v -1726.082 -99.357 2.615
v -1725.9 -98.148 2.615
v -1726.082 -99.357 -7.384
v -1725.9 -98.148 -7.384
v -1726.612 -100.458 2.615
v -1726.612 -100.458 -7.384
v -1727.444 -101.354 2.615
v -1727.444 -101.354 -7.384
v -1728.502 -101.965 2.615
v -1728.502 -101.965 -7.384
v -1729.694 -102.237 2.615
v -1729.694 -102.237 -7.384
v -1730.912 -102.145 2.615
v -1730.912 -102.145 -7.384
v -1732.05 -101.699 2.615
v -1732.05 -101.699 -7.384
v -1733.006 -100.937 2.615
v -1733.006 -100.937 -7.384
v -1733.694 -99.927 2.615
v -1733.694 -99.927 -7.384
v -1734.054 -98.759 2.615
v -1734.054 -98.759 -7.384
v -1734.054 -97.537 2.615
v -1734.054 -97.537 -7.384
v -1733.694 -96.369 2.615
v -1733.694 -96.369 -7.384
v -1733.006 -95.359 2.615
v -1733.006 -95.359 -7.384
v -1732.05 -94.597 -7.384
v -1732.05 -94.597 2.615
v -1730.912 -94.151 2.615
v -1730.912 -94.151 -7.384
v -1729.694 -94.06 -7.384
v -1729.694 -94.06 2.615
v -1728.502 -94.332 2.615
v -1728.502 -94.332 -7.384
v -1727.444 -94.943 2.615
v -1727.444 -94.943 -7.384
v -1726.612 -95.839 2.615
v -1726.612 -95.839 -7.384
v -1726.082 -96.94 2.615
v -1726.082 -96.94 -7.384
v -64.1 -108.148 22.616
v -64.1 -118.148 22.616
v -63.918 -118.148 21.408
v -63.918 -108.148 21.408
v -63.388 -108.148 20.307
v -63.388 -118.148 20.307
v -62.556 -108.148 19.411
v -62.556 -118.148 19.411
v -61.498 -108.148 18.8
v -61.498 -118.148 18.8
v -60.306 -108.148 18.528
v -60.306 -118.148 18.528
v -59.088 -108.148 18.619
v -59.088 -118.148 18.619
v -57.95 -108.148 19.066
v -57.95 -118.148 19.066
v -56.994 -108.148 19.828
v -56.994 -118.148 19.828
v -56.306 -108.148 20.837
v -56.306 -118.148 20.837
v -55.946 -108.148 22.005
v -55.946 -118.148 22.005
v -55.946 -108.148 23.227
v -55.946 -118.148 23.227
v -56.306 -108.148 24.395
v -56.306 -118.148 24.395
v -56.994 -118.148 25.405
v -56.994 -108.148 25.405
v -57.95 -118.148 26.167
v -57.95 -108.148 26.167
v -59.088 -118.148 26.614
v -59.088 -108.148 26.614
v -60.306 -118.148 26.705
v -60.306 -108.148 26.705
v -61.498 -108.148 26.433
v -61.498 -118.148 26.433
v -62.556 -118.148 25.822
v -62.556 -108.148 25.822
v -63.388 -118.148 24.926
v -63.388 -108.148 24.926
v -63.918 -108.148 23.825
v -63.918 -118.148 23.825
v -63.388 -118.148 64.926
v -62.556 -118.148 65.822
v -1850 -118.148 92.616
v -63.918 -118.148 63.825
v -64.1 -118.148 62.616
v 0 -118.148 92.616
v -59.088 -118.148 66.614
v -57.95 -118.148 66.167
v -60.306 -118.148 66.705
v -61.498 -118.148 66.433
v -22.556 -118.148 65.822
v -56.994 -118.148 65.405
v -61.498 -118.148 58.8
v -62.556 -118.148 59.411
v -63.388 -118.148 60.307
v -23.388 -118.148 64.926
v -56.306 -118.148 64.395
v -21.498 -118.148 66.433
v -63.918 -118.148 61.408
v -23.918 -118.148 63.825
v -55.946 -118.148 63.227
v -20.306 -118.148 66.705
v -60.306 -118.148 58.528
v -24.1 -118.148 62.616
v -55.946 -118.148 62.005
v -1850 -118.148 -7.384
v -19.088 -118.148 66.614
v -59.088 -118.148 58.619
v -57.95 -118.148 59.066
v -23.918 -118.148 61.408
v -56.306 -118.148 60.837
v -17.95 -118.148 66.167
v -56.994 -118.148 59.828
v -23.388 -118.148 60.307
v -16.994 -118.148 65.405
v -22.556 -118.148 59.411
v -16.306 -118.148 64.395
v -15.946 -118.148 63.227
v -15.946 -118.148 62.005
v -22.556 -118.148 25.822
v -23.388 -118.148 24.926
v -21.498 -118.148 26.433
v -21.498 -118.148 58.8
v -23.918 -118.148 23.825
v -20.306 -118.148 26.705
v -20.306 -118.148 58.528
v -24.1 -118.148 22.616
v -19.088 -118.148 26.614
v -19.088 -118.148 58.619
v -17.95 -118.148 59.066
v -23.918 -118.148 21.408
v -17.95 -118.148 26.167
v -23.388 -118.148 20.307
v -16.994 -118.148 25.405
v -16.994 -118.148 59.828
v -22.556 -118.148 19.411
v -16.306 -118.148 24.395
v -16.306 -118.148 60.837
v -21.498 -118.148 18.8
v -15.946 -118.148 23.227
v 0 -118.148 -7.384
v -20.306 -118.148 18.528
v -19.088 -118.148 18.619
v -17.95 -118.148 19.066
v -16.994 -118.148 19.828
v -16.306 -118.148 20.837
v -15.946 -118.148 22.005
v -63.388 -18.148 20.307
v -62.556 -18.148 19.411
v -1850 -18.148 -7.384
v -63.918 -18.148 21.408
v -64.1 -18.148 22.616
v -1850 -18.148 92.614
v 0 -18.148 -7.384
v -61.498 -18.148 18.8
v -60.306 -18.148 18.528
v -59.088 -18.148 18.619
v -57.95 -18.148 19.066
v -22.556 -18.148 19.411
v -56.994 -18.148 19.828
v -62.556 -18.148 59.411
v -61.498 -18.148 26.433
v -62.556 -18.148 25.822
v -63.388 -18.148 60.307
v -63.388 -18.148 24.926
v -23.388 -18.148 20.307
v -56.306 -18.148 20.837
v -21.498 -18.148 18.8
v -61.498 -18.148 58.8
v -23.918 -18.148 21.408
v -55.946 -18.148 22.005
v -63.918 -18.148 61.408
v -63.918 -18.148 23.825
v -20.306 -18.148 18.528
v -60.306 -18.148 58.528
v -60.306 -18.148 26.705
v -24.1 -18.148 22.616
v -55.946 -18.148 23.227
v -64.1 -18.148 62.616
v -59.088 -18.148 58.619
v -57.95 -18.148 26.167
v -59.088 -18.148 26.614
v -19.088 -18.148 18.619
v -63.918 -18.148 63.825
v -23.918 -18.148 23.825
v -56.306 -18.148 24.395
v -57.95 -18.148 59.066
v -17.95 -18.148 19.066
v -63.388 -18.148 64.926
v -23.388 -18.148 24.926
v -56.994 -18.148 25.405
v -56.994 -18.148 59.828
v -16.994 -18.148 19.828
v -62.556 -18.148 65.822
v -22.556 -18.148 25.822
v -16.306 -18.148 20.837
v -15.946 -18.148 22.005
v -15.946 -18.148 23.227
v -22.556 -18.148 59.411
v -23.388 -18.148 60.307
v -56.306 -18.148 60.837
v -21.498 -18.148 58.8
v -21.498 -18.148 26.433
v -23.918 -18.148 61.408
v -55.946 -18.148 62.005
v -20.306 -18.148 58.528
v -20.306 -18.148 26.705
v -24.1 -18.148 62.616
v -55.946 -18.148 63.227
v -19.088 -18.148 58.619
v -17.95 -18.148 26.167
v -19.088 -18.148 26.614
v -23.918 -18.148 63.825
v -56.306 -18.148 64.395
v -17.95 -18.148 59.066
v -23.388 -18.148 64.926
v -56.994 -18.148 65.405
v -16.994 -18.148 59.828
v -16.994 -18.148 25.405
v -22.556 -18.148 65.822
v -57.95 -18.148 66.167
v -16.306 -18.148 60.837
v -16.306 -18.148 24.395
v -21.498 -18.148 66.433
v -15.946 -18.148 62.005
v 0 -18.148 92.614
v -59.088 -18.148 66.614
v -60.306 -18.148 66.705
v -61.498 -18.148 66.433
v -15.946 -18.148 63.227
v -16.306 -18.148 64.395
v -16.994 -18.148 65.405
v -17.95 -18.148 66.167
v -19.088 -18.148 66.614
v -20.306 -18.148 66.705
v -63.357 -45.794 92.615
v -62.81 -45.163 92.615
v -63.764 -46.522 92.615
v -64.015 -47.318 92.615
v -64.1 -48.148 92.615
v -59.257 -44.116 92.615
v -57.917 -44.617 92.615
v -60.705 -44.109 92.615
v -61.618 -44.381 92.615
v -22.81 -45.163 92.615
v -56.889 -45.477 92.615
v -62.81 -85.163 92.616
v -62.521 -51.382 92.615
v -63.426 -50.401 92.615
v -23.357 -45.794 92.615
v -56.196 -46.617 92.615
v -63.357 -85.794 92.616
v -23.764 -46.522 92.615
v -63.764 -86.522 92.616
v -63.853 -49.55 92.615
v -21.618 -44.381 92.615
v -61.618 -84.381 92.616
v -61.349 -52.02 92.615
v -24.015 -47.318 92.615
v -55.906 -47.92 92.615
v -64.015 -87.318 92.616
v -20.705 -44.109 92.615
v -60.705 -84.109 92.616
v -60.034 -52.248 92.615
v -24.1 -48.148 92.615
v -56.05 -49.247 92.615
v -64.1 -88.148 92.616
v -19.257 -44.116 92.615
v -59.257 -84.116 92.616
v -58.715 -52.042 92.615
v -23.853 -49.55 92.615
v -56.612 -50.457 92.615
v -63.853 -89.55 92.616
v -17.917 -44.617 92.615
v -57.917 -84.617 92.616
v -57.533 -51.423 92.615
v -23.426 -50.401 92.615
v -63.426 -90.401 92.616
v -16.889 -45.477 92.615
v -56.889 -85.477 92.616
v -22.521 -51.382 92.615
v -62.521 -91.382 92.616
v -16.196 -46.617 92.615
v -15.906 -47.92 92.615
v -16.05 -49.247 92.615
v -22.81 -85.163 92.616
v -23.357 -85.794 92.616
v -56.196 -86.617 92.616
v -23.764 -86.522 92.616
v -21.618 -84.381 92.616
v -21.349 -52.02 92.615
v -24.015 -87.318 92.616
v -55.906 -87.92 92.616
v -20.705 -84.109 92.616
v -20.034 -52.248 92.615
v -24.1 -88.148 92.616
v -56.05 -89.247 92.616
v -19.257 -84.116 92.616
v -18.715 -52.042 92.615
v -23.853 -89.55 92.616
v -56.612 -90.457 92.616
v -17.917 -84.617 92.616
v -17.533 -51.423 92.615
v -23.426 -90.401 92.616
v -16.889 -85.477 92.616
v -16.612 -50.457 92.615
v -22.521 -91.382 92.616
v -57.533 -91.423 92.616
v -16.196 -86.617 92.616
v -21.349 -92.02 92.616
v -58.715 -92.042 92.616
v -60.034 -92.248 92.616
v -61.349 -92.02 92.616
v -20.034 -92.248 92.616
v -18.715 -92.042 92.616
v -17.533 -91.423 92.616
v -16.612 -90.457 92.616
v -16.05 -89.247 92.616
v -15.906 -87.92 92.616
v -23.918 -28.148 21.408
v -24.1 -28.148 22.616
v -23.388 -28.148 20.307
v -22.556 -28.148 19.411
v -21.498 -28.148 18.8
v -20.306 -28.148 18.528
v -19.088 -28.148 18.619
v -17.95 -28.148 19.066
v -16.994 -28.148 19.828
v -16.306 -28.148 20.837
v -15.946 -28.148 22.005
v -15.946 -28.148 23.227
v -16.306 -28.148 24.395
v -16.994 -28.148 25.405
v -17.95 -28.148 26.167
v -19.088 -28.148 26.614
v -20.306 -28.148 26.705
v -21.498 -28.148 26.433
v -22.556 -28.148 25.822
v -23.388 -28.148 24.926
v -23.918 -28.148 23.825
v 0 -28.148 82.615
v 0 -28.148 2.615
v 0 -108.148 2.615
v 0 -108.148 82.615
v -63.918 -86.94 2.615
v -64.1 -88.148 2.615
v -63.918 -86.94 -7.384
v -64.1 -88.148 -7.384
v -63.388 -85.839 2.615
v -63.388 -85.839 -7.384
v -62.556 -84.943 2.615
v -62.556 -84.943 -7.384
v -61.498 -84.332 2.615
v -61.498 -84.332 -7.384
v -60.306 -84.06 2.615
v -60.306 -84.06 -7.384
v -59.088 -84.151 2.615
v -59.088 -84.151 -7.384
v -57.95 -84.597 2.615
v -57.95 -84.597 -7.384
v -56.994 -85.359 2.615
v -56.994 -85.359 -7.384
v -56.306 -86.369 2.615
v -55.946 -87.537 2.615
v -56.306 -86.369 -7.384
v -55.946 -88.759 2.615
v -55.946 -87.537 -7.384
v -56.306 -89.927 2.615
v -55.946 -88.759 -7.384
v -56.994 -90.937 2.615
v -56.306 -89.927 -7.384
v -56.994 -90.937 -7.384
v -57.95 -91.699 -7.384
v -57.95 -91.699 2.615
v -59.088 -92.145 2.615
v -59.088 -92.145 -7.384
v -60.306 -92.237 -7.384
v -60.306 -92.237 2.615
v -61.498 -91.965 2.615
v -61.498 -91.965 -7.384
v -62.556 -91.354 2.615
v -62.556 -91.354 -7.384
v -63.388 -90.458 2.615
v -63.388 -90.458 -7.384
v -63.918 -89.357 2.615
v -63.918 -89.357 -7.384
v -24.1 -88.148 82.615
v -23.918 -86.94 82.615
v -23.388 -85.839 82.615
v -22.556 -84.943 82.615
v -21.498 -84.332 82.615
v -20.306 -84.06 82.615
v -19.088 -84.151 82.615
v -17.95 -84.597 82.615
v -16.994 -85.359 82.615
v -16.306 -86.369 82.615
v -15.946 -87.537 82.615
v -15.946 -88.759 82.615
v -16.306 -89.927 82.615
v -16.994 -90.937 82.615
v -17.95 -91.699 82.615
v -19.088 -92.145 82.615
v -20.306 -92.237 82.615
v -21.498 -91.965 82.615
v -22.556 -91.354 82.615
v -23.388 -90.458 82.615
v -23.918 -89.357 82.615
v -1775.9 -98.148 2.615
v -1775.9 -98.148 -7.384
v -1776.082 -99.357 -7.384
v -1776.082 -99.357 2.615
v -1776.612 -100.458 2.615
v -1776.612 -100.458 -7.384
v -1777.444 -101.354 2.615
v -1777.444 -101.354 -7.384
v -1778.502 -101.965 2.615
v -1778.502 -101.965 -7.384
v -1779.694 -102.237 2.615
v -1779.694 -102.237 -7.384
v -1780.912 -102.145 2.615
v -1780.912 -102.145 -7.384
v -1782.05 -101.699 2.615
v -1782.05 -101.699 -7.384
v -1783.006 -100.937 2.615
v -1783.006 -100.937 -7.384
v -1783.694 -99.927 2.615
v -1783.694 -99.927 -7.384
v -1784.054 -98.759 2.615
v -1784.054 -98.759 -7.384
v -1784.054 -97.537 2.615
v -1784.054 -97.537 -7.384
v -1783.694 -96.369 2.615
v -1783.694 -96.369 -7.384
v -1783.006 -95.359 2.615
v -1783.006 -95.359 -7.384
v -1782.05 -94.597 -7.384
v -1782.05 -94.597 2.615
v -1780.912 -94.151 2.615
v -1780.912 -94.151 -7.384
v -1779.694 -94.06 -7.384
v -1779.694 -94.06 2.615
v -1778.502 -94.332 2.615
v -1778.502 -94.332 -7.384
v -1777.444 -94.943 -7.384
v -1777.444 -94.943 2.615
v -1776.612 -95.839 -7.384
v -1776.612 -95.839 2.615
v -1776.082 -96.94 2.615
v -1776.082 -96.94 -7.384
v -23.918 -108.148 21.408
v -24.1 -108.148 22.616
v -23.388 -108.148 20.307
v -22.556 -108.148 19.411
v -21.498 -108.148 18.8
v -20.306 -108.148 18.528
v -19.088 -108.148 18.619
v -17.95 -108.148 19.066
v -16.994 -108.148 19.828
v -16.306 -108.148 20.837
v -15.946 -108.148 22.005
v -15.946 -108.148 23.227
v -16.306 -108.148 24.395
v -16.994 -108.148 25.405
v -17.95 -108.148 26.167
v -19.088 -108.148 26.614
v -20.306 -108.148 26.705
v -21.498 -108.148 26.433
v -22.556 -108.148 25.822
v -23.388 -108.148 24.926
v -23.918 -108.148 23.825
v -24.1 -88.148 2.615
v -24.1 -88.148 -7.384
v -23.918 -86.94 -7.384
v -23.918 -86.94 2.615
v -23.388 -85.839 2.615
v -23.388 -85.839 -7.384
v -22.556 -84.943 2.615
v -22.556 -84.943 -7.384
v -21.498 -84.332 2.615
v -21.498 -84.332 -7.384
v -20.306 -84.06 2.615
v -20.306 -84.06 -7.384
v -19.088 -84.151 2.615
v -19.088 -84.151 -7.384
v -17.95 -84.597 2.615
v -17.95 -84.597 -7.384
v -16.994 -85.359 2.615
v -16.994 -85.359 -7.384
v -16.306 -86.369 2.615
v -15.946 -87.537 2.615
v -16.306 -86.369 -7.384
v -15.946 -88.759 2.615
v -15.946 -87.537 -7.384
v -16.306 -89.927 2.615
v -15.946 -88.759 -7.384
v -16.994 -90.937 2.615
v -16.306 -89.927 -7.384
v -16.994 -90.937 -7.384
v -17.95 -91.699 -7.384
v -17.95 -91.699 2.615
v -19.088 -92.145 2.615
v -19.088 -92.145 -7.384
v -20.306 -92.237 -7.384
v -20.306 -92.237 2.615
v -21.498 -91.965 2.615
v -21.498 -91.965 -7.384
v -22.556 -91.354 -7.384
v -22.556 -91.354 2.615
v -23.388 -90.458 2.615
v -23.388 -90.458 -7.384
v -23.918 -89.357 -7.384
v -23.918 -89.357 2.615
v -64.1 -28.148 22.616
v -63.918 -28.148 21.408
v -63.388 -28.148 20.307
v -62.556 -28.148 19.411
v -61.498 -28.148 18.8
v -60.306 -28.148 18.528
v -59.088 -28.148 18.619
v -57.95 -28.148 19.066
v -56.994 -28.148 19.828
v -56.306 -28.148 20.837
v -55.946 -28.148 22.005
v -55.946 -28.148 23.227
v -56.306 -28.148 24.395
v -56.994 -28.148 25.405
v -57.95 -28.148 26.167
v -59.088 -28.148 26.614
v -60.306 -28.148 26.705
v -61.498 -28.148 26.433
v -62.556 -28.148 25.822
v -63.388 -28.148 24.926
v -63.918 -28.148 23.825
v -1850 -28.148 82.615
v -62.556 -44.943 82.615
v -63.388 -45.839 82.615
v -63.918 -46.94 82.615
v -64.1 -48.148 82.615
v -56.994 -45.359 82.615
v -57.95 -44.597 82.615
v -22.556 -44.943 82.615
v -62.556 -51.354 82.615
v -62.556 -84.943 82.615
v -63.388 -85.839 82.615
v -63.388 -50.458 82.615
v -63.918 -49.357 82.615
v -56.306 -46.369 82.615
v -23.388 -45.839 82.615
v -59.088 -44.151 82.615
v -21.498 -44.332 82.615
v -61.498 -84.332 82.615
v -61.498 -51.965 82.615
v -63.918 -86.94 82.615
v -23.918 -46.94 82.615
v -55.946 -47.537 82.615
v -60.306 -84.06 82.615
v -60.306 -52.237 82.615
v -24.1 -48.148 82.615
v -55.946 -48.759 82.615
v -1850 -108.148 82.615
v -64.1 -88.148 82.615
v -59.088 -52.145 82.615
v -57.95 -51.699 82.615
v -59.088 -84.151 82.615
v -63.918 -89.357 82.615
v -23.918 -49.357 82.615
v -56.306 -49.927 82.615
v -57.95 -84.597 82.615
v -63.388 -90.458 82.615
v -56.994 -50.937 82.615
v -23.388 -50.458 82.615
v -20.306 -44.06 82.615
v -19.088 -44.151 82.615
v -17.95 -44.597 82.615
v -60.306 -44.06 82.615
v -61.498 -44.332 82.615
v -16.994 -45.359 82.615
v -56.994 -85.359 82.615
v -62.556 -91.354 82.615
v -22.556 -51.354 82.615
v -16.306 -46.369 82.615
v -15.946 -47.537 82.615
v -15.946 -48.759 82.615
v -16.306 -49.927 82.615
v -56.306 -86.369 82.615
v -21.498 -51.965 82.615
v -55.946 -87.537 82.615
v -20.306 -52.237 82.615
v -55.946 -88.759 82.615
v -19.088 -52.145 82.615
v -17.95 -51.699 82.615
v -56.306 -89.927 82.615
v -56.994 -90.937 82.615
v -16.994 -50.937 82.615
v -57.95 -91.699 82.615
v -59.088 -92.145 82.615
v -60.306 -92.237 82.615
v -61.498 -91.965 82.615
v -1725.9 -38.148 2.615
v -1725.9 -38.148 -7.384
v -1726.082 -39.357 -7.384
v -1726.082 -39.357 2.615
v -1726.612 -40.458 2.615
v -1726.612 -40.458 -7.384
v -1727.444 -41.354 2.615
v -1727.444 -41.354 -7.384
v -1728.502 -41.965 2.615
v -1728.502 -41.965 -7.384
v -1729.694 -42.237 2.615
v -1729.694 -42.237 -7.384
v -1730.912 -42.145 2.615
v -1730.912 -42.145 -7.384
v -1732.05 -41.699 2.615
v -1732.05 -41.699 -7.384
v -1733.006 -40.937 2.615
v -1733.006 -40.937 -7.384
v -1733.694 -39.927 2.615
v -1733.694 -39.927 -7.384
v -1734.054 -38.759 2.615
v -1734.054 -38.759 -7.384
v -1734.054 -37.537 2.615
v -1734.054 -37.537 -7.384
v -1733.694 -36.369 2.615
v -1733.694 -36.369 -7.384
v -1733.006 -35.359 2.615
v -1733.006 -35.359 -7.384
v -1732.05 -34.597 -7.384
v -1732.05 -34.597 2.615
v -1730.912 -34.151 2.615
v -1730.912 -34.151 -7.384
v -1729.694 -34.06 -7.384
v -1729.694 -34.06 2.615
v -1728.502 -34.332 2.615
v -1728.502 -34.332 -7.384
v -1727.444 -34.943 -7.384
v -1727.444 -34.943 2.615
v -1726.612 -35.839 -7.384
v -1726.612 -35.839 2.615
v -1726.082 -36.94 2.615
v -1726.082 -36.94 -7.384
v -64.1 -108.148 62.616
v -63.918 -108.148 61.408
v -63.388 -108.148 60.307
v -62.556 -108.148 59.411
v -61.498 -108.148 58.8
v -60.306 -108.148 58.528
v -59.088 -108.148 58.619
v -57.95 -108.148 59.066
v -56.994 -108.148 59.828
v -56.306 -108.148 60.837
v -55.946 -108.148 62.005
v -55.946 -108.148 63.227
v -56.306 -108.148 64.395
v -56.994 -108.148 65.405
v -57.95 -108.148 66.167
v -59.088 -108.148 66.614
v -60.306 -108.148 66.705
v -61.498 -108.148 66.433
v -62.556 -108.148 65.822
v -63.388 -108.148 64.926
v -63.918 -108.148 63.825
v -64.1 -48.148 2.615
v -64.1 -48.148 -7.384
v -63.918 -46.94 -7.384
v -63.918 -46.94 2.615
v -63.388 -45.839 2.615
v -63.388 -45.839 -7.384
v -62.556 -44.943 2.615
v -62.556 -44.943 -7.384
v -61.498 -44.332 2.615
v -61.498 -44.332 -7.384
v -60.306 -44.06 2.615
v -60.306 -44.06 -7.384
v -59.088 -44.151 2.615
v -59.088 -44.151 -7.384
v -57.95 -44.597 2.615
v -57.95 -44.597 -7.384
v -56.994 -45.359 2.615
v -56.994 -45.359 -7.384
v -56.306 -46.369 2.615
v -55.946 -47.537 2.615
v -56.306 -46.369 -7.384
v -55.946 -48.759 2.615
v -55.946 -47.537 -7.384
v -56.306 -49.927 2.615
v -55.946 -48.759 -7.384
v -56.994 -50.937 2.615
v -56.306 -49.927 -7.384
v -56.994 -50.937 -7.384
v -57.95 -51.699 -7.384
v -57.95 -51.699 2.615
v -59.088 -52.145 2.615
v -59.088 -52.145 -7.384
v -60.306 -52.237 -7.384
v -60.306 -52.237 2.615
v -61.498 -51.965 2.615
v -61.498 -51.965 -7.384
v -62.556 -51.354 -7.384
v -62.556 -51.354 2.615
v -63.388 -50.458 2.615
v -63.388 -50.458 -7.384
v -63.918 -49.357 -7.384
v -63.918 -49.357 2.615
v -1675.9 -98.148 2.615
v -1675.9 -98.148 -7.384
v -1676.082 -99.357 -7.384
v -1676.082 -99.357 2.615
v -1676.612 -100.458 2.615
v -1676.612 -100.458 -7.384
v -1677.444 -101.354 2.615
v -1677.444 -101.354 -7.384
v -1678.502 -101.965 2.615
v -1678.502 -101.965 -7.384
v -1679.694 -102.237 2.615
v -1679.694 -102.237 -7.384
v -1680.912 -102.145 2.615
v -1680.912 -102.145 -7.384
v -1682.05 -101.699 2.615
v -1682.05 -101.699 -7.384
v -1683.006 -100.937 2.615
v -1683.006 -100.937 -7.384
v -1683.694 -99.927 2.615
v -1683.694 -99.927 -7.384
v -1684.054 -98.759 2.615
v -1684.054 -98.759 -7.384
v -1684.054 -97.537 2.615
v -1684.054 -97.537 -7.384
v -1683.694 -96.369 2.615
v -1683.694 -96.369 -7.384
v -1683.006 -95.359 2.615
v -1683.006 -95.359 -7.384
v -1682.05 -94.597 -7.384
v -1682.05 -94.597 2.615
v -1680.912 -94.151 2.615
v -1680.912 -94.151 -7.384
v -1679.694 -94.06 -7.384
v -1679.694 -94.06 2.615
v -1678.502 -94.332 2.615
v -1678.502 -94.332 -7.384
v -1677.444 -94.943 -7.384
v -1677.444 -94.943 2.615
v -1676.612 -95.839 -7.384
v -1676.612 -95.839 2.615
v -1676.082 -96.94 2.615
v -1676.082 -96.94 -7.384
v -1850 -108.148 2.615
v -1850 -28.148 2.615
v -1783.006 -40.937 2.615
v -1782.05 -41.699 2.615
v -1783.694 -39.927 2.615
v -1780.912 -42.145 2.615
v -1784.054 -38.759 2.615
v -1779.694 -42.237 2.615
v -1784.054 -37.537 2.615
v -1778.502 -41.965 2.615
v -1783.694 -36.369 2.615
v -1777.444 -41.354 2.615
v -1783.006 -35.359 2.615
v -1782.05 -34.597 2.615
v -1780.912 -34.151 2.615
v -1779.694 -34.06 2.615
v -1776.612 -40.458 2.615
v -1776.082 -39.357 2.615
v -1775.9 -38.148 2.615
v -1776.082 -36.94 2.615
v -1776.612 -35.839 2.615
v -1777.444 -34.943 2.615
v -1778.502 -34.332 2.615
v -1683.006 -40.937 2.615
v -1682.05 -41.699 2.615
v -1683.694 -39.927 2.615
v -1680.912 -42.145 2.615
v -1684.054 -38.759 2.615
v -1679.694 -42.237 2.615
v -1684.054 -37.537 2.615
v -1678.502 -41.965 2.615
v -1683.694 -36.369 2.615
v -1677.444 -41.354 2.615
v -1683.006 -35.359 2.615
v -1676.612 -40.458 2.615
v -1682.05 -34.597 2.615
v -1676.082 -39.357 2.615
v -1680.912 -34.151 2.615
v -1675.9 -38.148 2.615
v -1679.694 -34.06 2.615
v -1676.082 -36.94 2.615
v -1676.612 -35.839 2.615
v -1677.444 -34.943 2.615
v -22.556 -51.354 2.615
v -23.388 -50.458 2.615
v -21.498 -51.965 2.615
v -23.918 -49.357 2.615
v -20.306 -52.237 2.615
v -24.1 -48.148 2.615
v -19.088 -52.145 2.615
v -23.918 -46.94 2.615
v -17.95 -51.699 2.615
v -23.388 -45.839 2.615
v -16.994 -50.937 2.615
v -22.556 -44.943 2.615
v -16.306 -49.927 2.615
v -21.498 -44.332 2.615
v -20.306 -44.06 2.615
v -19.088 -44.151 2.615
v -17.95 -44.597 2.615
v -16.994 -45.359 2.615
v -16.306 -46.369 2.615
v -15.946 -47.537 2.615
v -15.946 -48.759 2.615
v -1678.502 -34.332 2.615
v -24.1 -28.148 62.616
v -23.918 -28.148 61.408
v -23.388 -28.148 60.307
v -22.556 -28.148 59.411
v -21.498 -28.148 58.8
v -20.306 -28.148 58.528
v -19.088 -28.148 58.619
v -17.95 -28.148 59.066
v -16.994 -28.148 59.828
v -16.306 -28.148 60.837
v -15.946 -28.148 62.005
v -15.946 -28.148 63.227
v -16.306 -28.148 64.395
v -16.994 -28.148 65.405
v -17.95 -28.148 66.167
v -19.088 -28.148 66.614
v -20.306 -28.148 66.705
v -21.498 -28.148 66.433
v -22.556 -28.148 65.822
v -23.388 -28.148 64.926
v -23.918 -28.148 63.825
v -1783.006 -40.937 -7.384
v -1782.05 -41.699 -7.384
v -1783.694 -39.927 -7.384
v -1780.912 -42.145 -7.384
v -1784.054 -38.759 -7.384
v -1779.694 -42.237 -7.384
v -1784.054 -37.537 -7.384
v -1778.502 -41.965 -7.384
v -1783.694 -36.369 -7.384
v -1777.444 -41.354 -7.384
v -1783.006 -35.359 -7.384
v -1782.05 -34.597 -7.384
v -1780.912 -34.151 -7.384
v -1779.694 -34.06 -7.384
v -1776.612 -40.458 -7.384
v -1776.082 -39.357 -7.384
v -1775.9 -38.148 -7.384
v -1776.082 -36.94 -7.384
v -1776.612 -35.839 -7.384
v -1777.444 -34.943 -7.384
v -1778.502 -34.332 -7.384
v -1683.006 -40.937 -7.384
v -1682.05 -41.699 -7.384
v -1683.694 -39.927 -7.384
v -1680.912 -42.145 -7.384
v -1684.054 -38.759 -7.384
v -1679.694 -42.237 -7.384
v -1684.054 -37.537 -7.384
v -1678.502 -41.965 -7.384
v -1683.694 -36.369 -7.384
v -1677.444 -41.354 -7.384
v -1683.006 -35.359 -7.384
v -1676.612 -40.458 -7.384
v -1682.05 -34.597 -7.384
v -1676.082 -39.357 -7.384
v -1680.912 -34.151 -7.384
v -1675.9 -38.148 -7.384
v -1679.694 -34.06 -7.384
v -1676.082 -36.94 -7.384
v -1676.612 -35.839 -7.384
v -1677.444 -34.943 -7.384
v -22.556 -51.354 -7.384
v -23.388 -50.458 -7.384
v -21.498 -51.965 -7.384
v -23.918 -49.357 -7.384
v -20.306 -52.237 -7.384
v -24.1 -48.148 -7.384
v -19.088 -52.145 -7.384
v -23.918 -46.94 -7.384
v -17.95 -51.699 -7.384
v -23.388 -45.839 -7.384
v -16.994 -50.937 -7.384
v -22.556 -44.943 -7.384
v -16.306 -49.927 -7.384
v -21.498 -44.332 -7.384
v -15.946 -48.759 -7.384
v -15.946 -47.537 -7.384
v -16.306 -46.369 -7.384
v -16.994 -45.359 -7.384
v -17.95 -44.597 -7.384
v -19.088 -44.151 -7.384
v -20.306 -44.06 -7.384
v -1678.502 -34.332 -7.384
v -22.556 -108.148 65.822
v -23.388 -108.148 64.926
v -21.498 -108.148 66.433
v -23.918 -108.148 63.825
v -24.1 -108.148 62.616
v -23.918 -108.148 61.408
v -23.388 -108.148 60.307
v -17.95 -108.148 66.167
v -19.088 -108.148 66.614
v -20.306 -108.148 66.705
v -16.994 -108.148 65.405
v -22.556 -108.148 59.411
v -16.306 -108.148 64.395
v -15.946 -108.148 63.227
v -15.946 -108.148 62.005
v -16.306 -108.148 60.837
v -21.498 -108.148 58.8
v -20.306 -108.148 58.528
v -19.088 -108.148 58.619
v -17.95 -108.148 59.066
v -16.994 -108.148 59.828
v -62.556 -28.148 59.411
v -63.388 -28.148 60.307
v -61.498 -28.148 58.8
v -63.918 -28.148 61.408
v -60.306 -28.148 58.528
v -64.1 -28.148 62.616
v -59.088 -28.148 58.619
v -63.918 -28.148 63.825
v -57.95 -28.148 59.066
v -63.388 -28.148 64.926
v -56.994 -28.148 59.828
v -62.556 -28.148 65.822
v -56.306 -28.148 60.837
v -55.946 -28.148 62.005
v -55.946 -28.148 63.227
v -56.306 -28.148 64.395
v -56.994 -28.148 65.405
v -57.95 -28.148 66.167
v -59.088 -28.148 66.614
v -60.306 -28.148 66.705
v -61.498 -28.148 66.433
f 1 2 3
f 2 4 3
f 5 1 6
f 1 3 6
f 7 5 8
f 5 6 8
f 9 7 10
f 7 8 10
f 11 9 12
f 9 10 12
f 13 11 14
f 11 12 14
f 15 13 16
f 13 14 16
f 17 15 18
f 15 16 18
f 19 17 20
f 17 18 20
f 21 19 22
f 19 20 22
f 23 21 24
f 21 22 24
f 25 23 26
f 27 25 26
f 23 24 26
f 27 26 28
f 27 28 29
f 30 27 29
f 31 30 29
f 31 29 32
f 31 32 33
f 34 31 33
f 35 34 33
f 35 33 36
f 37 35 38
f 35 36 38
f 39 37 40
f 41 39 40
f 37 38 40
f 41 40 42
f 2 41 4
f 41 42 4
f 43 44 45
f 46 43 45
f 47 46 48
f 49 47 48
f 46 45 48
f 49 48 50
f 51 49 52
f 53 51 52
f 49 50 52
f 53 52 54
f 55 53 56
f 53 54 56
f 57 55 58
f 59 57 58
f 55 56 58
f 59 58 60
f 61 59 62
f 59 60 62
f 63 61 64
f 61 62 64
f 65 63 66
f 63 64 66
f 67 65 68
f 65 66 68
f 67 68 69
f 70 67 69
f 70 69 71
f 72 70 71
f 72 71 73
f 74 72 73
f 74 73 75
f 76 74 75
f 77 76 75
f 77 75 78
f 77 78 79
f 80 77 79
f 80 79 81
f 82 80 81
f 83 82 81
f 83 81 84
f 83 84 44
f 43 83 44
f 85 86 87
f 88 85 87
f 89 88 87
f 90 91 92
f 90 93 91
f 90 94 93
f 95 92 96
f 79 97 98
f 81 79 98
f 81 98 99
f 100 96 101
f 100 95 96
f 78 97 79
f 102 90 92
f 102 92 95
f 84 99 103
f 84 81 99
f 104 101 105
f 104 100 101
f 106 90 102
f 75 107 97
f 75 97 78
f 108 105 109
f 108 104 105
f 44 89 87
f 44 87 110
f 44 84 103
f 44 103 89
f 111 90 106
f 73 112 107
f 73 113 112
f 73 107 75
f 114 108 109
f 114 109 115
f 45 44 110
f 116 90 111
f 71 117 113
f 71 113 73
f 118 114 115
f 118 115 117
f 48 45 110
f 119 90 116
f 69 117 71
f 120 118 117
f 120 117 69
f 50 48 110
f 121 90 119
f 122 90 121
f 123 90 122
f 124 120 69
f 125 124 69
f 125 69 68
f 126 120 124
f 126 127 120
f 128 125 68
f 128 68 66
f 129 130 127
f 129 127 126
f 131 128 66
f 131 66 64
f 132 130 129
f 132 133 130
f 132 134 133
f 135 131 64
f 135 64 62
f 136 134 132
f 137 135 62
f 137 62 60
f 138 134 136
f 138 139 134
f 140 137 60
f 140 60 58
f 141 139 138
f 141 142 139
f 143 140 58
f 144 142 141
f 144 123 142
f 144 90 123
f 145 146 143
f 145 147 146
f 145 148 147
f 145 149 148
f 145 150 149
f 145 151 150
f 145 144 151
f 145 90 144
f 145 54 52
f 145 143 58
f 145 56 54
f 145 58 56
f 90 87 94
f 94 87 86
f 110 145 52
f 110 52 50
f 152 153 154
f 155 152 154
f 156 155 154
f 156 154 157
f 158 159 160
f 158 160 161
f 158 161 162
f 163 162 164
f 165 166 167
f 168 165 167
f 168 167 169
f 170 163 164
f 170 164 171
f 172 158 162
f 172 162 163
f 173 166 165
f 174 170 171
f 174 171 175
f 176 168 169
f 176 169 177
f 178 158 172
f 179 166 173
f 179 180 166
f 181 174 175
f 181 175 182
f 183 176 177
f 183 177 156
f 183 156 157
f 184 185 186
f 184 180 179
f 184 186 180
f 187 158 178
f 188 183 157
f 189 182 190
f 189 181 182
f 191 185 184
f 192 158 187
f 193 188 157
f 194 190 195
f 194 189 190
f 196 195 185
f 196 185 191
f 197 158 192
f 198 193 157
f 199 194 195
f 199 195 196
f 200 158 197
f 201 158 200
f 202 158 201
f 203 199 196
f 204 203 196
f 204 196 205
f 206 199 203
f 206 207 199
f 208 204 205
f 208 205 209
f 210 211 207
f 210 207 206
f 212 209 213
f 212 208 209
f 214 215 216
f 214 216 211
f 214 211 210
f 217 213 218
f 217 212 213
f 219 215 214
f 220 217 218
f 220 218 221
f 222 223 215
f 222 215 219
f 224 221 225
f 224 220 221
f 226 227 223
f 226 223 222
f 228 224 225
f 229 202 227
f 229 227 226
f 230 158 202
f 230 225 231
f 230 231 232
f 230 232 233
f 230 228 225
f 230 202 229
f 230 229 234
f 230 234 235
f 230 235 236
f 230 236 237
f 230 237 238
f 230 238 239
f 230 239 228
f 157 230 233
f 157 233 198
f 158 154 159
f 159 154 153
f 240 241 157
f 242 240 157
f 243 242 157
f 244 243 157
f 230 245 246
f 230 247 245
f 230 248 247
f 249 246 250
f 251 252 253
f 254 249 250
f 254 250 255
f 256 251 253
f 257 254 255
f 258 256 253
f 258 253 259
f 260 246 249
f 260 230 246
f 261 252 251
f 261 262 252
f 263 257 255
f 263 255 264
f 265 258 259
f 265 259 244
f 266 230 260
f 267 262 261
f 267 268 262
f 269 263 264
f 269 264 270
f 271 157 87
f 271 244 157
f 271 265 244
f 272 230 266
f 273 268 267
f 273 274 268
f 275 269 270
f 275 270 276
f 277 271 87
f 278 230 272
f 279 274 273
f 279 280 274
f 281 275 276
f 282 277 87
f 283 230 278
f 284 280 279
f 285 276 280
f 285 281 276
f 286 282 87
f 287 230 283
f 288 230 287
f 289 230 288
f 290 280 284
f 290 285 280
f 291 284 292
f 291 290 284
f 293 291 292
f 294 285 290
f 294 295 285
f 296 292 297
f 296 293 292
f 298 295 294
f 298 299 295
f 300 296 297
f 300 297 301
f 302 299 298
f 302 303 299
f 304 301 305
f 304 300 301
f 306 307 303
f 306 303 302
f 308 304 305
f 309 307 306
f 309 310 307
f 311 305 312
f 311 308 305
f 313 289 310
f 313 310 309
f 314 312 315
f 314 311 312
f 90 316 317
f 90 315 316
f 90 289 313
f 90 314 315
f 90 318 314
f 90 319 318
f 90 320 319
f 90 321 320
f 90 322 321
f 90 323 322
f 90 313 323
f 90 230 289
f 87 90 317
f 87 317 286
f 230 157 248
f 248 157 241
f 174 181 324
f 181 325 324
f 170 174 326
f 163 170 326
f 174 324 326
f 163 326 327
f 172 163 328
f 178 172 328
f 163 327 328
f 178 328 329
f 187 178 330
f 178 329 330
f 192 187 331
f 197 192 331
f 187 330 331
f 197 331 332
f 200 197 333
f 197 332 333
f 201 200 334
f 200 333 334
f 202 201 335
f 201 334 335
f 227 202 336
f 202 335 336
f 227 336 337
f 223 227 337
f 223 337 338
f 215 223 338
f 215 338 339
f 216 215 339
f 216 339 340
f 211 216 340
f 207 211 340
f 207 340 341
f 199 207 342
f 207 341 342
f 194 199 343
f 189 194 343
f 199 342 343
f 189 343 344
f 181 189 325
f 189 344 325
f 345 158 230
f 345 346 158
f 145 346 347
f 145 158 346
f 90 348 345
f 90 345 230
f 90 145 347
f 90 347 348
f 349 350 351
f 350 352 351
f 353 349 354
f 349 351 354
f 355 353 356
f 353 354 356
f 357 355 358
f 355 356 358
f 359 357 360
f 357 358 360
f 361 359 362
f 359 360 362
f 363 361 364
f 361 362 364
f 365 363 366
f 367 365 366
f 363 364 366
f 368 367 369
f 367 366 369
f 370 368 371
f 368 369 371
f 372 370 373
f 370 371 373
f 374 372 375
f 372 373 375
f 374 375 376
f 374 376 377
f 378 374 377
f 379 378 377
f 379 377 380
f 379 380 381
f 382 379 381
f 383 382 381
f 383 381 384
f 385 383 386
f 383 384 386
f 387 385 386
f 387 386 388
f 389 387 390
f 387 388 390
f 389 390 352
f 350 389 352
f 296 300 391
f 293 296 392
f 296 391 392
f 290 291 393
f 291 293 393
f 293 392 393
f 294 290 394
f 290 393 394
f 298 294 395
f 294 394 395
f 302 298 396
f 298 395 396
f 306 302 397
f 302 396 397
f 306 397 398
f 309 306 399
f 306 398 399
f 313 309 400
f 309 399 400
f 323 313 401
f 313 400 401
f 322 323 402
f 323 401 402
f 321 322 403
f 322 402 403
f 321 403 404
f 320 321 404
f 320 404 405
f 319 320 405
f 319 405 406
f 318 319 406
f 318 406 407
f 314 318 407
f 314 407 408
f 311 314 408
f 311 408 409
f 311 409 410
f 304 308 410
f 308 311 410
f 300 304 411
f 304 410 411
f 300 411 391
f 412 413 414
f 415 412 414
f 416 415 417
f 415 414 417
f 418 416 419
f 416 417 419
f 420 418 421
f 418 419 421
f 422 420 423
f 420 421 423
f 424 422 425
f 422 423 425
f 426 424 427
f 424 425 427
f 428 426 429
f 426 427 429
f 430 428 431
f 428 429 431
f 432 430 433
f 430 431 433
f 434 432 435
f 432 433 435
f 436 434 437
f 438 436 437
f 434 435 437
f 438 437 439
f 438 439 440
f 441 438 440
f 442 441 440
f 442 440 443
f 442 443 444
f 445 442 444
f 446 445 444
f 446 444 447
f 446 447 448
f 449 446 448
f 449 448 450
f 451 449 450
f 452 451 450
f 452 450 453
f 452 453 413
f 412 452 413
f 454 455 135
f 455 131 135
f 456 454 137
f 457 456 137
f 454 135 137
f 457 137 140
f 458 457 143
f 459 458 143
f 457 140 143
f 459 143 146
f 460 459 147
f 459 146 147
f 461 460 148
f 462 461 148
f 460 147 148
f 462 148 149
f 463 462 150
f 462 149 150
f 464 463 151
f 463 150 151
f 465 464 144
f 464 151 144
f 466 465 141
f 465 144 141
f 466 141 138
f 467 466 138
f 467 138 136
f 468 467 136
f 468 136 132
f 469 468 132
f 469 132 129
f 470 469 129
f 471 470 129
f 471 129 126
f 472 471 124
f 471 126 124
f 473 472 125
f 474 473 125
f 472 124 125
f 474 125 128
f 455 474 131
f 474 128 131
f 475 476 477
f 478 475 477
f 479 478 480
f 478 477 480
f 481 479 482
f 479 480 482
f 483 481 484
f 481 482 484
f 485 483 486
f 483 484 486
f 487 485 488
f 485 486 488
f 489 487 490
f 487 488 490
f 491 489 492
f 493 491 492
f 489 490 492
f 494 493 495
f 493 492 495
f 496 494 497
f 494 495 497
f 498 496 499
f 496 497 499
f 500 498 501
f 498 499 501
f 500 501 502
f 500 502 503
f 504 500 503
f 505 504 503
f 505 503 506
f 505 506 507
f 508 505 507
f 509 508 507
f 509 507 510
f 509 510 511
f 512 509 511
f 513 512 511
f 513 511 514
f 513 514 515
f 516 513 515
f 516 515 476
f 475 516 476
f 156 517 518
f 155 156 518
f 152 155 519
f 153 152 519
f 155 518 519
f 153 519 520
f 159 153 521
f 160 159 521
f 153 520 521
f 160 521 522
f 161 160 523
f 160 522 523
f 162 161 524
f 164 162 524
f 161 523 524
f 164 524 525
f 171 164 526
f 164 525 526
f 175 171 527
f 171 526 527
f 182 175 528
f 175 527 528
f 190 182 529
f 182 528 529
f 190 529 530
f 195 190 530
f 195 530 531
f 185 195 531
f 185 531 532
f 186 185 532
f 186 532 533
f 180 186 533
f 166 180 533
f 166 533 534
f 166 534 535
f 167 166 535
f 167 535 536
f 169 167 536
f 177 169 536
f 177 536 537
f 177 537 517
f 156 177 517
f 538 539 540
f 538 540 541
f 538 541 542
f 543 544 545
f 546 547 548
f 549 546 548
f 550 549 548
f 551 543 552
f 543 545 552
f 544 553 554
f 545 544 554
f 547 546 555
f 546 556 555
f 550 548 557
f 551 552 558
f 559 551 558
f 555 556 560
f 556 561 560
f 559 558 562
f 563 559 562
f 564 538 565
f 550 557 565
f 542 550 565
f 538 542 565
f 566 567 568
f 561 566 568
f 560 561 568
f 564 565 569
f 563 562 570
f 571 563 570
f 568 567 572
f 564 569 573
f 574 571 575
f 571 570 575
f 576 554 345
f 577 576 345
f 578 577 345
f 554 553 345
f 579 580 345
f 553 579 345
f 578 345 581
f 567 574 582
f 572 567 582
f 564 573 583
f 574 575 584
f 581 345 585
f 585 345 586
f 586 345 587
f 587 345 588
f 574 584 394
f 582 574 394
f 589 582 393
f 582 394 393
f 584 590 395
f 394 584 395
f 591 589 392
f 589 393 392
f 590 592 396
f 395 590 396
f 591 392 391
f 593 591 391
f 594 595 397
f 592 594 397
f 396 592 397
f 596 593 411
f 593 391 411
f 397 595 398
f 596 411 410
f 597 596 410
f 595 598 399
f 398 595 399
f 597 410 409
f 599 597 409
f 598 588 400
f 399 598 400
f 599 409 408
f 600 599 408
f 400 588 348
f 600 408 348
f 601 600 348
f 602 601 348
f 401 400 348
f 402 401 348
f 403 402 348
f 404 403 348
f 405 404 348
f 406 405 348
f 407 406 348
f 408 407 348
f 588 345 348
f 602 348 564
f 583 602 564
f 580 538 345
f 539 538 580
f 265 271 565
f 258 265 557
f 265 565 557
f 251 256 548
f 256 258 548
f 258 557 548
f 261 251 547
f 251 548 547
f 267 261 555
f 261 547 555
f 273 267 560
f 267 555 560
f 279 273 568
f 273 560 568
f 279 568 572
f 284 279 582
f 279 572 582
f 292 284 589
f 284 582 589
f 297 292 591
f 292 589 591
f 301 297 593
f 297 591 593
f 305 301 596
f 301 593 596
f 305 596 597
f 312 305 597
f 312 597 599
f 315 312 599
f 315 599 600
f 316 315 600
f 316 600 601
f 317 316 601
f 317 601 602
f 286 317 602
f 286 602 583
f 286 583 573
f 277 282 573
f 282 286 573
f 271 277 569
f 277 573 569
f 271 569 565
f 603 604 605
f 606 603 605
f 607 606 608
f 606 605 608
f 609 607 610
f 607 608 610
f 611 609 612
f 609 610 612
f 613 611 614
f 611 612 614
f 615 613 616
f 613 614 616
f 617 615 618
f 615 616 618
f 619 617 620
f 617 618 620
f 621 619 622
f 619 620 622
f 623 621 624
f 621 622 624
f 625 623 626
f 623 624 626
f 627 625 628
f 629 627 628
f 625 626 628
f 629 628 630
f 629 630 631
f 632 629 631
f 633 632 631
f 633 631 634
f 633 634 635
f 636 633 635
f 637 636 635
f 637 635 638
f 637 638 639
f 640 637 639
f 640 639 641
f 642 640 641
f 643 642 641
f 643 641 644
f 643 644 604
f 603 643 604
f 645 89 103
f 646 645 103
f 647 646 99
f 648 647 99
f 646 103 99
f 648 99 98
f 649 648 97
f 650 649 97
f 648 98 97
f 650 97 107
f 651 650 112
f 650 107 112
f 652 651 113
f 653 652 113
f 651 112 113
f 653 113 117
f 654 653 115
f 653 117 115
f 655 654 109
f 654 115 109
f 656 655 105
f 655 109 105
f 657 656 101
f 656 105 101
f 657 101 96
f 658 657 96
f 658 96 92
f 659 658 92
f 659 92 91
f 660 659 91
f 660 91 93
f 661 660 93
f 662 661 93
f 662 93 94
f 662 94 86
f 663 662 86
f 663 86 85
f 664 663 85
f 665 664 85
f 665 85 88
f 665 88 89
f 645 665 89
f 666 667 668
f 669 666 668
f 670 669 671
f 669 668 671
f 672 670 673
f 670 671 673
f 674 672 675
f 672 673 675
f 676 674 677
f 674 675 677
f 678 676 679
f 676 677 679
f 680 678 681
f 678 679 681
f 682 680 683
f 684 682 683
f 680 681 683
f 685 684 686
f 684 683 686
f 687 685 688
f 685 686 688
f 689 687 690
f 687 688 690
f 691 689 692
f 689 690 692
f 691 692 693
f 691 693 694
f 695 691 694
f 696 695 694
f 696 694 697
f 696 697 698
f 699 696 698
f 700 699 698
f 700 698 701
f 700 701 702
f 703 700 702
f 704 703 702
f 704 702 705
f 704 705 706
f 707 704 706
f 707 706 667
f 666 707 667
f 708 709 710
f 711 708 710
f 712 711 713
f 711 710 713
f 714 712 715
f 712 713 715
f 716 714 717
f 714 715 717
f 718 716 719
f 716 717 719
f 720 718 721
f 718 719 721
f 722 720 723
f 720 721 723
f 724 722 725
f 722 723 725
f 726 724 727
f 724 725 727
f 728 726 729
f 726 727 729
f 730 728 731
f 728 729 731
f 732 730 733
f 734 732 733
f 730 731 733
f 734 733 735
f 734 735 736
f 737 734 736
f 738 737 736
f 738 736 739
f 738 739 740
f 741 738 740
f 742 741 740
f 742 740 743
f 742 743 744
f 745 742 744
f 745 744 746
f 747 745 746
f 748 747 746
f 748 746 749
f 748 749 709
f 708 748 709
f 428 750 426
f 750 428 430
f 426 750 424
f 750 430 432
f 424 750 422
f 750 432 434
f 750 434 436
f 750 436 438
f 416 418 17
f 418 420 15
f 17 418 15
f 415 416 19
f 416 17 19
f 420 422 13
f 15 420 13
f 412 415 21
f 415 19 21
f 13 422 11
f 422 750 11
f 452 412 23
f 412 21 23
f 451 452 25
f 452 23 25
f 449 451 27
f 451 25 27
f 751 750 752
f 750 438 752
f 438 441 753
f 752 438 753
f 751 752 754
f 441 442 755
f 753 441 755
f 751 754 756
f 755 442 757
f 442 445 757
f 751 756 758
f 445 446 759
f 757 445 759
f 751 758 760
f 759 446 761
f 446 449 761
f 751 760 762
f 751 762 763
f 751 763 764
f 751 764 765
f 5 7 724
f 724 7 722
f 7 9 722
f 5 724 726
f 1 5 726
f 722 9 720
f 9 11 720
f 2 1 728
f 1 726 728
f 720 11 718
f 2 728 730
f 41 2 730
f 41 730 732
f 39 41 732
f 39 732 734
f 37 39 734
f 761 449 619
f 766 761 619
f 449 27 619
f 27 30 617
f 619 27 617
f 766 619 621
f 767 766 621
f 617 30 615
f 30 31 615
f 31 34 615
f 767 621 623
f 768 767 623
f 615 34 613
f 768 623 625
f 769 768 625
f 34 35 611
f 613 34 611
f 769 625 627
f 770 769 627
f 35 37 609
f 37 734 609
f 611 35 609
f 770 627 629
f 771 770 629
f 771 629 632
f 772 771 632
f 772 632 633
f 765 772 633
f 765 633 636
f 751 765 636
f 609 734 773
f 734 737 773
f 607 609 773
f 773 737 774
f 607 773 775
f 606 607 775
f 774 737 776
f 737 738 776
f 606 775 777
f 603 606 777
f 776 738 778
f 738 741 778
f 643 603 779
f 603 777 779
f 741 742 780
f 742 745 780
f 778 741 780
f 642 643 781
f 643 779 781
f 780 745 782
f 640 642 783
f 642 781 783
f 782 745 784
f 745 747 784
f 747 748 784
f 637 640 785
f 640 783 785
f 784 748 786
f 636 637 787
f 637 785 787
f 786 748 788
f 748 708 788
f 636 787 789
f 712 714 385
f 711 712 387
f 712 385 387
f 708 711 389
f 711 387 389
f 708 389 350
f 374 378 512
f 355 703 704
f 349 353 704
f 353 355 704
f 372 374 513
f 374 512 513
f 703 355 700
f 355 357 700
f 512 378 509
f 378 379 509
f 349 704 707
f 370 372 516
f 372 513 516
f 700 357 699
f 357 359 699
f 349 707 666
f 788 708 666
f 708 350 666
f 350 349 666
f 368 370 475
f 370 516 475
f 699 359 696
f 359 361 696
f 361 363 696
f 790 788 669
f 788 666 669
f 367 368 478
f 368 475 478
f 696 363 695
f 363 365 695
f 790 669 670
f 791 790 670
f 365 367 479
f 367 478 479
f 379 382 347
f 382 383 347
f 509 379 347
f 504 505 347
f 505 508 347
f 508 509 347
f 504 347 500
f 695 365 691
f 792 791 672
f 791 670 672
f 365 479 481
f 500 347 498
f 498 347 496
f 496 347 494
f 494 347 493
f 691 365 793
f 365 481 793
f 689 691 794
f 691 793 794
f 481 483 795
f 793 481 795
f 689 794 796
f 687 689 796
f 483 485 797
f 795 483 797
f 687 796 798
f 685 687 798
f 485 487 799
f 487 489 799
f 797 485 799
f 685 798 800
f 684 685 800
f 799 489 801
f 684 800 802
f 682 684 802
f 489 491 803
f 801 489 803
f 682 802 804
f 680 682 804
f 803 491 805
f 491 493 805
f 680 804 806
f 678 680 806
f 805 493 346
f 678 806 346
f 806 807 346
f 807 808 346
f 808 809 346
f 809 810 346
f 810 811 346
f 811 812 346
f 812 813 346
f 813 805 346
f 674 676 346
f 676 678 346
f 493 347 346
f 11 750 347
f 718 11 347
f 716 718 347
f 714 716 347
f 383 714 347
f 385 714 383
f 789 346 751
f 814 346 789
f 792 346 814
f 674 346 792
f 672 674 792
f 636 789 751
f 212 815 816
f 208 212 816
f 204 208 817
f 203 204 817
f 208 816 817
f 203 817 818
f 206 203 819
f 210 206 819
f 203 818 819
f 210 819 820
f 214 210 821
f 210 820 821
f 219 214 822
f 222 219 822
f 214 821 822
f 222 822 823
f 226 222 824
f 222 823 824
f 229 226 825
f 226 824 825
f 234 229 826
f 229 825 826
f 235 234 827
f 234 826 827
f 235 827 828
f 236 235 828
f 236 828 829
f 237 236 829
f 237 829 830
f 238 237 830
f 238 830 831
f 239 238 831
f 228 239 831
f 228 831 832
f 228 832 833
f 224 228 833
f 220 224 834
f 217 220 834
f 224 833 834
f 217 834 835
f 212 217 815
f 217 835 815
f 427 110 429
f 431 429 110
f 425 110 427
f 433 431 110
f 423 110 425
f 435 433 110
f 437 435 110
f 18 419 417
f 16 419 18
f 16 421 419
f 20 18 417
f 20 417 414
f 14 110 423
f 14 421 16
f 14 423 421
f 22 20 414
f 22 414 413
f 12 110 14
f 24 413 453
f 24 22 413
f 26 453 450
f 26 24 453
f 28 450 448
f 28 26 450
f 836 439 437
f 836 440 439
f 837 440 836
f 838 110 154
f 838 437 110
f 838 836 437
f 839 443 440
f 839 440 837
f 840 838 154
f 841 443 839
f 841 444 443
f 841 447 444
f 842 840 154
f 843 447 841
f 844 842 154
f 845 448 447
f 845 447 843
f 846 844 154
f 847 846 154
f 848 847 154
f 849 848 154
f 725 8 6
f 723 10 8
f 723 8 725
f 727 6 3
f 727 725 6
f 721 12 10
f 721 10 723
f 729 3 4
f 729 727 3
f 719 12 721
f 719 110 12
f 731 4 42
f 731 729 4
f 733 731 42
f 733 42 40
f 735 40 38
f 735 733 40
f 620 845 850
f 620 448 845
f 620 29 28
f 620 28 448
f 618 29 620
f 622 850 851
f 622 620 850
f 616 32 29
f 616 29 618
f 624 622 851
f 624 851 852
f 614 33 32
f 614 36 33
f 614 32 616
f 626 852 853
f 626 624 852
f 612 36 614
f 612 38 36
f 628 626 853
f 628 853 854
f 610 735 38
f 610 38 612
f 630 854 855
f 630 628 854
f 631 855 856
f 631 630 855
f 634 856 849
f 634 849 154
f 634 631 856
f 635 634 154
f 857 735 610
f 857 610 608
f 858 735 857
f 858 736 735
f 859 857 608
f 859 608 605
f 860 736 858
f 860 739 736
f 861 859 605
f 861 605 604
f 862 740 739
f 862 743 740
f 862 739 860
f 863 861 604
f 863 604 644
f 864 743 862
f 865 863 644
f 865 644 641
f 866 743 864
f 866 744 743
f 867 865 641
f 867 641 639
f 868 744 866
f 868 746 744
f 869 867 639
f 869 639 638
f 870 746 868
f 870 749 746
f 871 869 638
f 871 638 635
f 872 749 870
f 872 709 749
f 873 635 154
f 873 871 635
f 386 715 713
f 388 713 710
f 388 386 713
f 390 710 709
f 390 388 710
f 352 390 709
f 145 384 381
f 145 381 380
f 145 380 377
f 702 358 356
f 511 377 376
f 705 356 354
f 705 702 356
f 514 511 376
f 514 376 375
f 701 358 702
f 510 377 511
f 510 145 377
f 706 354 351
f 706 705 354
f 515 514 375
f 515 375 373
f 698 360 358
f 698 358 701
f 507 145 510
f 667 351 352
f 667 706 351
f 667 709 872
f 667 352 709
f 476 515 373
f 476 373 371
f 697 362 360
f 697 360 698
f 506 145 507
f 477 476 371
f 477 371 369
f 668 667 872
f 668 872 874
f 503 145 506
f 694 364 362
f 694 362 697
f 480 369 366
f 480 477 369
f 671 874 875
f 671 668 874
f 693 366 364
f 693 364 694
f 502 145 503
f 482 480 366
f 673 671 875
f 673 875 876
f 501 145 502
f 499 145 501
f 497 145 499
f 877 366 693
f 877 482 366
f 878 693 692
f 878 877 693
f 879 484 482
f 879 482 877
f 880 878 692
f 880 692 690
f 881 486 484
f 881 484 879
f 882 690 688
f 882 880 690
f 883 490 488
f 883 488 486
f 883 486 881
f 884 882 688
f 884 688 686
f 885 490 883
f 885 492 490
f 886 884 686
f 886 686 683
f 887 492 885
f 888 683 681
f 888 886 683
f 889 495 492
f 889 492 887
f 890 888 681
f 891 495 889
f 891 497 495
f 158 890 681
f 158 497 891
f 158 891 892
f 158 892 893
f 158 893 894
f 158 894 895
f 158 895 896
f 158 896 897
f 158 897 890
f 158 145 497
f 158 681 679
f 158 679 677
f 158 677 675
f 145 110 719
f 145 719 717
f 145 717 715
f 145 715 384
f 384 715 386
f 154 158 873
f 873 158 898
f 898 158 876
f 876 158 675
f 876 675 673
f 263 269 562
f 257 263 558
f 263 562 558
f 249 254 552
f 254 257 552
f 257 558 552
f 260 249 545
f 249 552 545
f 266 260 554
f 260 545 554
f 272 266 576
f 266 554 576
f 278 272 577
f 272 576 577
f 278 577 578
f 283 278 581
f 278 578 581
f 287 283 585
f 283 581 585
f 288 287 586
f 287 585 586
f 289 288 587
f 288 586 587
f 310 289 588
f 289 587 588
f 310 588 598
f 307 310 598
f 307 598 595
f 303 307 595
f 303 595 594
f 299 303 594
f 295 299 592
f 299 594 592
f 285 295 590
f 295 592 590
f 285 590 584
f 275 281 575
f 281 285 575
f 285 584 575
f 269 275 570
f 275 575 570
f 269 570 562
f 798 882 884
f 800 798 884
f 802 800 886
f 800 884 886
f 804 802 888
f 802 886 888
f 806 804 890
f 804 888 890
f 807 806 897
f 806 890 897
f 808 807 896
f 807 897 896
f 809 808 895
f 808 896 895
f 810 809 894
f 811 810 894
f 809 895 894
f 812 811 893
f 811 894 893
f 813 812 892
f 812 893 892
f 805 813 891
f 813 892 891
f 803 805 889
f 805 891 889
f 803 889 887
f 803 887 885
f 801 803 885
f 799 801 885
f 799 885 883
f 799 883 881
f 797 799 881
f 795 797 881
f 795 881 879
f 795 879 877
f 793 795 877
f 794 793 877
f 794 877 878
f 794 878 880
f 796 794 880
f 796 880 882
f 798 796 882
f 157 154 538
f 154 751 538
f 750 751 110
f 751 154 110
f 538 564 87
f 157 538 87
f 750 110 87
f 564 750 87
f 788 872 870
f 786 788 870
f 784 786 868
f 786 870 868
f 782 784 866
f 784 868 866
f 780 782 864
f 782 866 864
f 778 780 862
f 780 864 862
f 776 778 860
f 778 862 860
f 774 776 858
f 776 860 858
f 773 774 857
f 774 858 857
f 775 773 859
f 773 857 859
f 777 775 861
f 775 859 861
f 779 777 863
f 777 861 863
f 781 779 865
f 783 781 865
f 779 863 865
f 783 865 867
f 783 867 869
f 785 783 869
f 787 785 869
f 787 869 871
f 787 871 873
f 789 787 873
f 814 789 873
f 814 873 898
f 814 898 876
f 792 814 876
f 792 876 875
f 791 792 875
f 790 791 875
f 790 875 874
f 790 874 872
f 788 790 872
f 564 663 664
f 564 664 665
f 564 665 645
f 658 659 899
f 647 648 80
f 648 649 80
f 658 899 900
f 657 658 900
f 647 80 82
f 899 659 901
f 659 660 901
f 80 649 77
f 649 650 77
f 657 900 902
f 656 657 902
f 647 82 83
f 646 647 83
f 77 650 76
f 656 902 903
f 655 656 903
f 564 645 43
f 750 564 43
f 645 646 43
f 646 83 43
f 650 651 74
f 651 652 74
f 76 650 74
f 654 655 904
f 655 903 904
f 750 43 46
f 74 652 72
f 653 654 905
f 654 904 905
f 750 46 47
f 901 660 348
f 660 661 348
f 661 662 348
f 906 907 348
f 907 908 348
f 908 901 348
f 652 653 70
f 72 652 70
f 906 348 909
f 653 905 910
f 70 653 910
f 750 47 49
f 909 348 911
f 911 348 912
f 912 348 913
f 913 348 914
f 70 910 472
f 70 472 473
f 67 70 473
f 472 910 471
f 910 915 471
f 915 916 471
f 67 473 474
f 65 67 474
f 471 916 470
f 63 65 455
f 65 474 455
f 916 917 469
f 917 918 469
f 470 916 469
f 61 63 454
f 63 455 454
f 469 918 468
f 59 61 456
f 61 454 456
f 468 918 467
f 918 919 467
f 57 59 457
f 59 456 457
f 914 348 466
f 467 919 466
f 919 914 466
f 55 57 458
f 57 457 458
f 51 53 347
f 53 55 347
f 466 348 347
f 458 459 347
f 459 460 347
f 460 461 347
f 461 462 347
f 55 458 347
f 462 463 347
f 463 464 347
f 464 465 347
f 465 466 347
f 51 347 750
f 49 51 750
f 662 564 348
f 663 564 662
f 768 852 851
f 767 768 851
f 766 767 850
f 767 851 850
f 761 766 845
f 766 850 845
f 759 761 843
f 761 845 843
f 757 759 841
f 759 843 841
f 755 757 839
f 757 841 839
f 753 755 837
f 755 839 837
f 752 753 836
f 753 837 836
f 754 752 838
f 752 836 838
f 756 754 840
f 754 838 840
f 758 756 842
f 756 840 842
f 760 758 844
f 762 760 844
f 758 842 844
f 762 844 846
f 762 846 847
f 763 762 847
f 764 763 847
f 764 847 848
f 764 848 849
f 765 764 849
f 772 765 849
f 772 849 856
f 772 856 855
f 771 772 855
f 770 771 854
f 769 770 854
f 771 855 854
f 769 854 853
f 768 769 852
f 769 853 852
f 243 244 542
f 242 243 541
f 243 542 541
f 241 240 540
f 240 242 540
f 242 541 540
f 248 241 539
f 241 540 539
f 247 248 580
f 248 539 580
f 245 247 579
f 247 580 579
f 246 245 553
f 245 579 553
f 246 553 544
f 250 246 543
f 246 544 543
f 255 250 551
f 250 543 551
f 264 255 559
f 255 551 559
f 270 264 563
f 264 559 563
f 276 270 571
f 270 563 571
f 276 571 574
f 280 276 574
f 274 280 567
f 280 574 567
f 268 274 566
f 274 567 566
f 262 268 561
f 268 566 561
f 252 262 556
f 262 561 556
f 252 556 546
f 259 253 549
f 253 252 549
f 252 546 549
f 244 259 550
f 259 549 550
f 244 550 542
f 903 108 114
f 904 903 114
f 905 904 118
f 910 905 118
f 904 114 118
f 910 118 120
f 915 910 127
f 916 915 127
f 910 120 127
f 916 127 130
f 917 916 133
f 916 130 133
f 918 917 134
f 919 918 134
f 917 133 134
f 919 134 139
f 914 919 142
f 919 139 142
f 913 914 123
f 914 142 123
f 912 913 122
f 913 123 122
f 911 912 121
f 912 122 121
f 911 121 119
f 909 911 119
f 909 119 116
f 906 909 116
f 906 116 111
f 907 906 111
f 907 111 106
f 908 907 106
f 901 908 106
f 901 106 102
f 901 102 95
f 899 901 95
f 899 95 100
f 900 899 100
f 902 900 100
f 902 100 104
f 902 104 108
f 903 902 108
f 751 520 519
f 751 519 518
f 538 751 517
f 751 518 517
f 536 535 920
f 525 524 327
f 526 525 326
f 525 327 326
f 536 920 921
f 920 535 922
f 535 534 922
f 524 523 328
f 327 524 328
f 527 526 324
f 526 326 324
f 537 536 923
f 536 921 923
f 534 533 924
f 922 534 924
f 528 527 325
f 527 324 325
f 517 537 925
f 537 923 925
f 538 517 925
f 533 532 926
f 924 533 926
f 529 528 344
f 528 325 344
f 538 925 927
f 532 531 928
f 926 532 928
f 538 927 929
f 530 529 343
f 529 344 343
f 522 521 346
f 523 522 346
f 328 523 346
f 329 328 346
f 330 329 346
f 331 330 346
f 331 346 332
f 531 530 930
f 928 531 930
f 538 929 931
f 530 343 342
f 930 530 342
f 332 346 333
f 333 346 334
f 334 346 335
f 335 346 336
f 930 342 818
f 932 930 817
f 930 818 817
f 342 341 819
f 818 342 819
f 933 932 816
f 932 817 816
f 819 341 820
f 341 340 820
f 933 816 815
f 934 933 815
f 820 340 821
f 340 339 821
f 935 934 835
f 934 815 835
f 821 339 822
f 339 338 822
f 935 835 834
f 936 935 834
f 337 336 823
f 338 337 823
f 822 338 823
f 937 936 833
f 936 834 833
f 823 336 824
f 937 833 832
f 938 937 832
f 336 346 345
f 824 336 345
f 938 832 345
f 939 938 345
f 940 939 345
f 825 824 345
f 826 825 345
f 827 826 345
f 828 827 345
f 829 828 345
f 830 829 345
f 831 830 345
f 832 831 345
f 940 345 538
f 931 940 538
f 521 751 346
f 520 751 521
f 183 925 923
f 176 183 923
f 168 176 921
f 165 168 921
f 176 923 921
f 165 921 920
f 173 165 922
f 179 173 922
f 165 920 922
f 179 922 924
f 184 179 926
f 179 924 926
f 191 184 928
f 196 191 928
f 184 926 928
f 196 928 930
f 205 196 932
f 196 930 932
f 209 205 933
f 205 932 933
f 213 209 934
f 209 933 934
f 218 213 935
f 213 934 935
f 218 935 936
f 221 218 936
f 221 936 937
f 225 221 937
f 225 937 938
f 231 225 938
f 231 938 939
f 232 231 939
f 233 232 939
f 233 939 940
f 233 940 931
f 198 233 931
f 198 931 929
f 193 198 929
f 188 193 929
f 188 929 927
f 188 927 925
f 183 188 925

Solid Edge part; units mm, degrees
sketch "Sketch1" plane through (0, 0, 0) normal (1, 0, 0) x (0, 1, 0)
  line L0 (-108.1482, 2.6153) -> (-28.1482, 2.6153)
  line L1 (-28.1482, 2.6153) -> (-28.1482, 82.6153)
  line L2 (-28.1482, 82.6153) -> (-108.1482, 82.6153)
  line L3 (-108.1482, 82.6153) -> (-108.1482, 2.6153)
  line L4 (-118.1482, -7.3837) -> (-18.1482, -7.3837)
  line L5 (-18.1482, -7.3837) -> (-18.1482, 92.6144)
  line L6 (-18.1482, 92.6144) -> (-118.1482, 92.6163)
  line L7 (-118.1482, 92.6163) -> (-118.1482, -7.3837)
  dimension "D1" = 100
  dimension "D2" = 100
  dimension "D3" = 80
  dimension "D4" = 80
extrude "Protrusion1" add sketch "Sketch1" against normal blind 1850
sketch "Sketch2" plane through (-925, -118.1482, 42.6163) normal (0, -1, 0) x (-1, 0, 0)
  circle A0 centre (-905, -20) radius 4.1
  circle A1 centre (-865, 20) radius 4.1
  circle A2 centre (-865, -20) radius 4.1
  circle A3 centre (-905, 20) radius 4.1
  dimension "D1" = 8.2
  dimension "D2" = 8.2
  dimension "D3" = 8.2
  dimension "D4" = 8.2
  dimension "D5" = 20
  dimension "D6" = 40
  dimension "D7" = 20
  dimension "D8" = 20
extrude "Cutout1" cut sketch "Sketch2" against normal through all
mirror "Mirror1" about plane through (-925, -153.5035, -42.739) normal (0, 0.7071, -0.7071) of "Cutout1"
sketch "Sketch3" plane through (-925, -68.1482, -7.3837) normal (0, 0, -1) x (1, 0, 0)
  circle A0 centre (-855, -30) radius 4.1
  circle A1 centre (-805, 30) radius 4.1
  circle A2 centre (-805, -30) radius 4.1
  circle A3 centre (-755, 30) radius 4.1
  circle A4 centre (-755, -30) radius 4.1
  circle A5 centre (-855, 30) radius 4.1
  dimension "D1" = 8.2
  dimension "D2" = 8.2
  dimension "D3" = 8.2
  dimension "D4" = 8.2
  dimension "D5" = 60
  dimension "D6" = 30
  dimension "D7" = 70
  dimension "D8" = 50
  dimension "D9" = 50
  dimension "D10" = 50
  dimension "D11" = 8.2
  dimension "D12" = 8.2
extrude "Cutout3" cut sketch "Sketch3" against normal blind 46.6265
properties material "Aluminum, 6061-T6"
